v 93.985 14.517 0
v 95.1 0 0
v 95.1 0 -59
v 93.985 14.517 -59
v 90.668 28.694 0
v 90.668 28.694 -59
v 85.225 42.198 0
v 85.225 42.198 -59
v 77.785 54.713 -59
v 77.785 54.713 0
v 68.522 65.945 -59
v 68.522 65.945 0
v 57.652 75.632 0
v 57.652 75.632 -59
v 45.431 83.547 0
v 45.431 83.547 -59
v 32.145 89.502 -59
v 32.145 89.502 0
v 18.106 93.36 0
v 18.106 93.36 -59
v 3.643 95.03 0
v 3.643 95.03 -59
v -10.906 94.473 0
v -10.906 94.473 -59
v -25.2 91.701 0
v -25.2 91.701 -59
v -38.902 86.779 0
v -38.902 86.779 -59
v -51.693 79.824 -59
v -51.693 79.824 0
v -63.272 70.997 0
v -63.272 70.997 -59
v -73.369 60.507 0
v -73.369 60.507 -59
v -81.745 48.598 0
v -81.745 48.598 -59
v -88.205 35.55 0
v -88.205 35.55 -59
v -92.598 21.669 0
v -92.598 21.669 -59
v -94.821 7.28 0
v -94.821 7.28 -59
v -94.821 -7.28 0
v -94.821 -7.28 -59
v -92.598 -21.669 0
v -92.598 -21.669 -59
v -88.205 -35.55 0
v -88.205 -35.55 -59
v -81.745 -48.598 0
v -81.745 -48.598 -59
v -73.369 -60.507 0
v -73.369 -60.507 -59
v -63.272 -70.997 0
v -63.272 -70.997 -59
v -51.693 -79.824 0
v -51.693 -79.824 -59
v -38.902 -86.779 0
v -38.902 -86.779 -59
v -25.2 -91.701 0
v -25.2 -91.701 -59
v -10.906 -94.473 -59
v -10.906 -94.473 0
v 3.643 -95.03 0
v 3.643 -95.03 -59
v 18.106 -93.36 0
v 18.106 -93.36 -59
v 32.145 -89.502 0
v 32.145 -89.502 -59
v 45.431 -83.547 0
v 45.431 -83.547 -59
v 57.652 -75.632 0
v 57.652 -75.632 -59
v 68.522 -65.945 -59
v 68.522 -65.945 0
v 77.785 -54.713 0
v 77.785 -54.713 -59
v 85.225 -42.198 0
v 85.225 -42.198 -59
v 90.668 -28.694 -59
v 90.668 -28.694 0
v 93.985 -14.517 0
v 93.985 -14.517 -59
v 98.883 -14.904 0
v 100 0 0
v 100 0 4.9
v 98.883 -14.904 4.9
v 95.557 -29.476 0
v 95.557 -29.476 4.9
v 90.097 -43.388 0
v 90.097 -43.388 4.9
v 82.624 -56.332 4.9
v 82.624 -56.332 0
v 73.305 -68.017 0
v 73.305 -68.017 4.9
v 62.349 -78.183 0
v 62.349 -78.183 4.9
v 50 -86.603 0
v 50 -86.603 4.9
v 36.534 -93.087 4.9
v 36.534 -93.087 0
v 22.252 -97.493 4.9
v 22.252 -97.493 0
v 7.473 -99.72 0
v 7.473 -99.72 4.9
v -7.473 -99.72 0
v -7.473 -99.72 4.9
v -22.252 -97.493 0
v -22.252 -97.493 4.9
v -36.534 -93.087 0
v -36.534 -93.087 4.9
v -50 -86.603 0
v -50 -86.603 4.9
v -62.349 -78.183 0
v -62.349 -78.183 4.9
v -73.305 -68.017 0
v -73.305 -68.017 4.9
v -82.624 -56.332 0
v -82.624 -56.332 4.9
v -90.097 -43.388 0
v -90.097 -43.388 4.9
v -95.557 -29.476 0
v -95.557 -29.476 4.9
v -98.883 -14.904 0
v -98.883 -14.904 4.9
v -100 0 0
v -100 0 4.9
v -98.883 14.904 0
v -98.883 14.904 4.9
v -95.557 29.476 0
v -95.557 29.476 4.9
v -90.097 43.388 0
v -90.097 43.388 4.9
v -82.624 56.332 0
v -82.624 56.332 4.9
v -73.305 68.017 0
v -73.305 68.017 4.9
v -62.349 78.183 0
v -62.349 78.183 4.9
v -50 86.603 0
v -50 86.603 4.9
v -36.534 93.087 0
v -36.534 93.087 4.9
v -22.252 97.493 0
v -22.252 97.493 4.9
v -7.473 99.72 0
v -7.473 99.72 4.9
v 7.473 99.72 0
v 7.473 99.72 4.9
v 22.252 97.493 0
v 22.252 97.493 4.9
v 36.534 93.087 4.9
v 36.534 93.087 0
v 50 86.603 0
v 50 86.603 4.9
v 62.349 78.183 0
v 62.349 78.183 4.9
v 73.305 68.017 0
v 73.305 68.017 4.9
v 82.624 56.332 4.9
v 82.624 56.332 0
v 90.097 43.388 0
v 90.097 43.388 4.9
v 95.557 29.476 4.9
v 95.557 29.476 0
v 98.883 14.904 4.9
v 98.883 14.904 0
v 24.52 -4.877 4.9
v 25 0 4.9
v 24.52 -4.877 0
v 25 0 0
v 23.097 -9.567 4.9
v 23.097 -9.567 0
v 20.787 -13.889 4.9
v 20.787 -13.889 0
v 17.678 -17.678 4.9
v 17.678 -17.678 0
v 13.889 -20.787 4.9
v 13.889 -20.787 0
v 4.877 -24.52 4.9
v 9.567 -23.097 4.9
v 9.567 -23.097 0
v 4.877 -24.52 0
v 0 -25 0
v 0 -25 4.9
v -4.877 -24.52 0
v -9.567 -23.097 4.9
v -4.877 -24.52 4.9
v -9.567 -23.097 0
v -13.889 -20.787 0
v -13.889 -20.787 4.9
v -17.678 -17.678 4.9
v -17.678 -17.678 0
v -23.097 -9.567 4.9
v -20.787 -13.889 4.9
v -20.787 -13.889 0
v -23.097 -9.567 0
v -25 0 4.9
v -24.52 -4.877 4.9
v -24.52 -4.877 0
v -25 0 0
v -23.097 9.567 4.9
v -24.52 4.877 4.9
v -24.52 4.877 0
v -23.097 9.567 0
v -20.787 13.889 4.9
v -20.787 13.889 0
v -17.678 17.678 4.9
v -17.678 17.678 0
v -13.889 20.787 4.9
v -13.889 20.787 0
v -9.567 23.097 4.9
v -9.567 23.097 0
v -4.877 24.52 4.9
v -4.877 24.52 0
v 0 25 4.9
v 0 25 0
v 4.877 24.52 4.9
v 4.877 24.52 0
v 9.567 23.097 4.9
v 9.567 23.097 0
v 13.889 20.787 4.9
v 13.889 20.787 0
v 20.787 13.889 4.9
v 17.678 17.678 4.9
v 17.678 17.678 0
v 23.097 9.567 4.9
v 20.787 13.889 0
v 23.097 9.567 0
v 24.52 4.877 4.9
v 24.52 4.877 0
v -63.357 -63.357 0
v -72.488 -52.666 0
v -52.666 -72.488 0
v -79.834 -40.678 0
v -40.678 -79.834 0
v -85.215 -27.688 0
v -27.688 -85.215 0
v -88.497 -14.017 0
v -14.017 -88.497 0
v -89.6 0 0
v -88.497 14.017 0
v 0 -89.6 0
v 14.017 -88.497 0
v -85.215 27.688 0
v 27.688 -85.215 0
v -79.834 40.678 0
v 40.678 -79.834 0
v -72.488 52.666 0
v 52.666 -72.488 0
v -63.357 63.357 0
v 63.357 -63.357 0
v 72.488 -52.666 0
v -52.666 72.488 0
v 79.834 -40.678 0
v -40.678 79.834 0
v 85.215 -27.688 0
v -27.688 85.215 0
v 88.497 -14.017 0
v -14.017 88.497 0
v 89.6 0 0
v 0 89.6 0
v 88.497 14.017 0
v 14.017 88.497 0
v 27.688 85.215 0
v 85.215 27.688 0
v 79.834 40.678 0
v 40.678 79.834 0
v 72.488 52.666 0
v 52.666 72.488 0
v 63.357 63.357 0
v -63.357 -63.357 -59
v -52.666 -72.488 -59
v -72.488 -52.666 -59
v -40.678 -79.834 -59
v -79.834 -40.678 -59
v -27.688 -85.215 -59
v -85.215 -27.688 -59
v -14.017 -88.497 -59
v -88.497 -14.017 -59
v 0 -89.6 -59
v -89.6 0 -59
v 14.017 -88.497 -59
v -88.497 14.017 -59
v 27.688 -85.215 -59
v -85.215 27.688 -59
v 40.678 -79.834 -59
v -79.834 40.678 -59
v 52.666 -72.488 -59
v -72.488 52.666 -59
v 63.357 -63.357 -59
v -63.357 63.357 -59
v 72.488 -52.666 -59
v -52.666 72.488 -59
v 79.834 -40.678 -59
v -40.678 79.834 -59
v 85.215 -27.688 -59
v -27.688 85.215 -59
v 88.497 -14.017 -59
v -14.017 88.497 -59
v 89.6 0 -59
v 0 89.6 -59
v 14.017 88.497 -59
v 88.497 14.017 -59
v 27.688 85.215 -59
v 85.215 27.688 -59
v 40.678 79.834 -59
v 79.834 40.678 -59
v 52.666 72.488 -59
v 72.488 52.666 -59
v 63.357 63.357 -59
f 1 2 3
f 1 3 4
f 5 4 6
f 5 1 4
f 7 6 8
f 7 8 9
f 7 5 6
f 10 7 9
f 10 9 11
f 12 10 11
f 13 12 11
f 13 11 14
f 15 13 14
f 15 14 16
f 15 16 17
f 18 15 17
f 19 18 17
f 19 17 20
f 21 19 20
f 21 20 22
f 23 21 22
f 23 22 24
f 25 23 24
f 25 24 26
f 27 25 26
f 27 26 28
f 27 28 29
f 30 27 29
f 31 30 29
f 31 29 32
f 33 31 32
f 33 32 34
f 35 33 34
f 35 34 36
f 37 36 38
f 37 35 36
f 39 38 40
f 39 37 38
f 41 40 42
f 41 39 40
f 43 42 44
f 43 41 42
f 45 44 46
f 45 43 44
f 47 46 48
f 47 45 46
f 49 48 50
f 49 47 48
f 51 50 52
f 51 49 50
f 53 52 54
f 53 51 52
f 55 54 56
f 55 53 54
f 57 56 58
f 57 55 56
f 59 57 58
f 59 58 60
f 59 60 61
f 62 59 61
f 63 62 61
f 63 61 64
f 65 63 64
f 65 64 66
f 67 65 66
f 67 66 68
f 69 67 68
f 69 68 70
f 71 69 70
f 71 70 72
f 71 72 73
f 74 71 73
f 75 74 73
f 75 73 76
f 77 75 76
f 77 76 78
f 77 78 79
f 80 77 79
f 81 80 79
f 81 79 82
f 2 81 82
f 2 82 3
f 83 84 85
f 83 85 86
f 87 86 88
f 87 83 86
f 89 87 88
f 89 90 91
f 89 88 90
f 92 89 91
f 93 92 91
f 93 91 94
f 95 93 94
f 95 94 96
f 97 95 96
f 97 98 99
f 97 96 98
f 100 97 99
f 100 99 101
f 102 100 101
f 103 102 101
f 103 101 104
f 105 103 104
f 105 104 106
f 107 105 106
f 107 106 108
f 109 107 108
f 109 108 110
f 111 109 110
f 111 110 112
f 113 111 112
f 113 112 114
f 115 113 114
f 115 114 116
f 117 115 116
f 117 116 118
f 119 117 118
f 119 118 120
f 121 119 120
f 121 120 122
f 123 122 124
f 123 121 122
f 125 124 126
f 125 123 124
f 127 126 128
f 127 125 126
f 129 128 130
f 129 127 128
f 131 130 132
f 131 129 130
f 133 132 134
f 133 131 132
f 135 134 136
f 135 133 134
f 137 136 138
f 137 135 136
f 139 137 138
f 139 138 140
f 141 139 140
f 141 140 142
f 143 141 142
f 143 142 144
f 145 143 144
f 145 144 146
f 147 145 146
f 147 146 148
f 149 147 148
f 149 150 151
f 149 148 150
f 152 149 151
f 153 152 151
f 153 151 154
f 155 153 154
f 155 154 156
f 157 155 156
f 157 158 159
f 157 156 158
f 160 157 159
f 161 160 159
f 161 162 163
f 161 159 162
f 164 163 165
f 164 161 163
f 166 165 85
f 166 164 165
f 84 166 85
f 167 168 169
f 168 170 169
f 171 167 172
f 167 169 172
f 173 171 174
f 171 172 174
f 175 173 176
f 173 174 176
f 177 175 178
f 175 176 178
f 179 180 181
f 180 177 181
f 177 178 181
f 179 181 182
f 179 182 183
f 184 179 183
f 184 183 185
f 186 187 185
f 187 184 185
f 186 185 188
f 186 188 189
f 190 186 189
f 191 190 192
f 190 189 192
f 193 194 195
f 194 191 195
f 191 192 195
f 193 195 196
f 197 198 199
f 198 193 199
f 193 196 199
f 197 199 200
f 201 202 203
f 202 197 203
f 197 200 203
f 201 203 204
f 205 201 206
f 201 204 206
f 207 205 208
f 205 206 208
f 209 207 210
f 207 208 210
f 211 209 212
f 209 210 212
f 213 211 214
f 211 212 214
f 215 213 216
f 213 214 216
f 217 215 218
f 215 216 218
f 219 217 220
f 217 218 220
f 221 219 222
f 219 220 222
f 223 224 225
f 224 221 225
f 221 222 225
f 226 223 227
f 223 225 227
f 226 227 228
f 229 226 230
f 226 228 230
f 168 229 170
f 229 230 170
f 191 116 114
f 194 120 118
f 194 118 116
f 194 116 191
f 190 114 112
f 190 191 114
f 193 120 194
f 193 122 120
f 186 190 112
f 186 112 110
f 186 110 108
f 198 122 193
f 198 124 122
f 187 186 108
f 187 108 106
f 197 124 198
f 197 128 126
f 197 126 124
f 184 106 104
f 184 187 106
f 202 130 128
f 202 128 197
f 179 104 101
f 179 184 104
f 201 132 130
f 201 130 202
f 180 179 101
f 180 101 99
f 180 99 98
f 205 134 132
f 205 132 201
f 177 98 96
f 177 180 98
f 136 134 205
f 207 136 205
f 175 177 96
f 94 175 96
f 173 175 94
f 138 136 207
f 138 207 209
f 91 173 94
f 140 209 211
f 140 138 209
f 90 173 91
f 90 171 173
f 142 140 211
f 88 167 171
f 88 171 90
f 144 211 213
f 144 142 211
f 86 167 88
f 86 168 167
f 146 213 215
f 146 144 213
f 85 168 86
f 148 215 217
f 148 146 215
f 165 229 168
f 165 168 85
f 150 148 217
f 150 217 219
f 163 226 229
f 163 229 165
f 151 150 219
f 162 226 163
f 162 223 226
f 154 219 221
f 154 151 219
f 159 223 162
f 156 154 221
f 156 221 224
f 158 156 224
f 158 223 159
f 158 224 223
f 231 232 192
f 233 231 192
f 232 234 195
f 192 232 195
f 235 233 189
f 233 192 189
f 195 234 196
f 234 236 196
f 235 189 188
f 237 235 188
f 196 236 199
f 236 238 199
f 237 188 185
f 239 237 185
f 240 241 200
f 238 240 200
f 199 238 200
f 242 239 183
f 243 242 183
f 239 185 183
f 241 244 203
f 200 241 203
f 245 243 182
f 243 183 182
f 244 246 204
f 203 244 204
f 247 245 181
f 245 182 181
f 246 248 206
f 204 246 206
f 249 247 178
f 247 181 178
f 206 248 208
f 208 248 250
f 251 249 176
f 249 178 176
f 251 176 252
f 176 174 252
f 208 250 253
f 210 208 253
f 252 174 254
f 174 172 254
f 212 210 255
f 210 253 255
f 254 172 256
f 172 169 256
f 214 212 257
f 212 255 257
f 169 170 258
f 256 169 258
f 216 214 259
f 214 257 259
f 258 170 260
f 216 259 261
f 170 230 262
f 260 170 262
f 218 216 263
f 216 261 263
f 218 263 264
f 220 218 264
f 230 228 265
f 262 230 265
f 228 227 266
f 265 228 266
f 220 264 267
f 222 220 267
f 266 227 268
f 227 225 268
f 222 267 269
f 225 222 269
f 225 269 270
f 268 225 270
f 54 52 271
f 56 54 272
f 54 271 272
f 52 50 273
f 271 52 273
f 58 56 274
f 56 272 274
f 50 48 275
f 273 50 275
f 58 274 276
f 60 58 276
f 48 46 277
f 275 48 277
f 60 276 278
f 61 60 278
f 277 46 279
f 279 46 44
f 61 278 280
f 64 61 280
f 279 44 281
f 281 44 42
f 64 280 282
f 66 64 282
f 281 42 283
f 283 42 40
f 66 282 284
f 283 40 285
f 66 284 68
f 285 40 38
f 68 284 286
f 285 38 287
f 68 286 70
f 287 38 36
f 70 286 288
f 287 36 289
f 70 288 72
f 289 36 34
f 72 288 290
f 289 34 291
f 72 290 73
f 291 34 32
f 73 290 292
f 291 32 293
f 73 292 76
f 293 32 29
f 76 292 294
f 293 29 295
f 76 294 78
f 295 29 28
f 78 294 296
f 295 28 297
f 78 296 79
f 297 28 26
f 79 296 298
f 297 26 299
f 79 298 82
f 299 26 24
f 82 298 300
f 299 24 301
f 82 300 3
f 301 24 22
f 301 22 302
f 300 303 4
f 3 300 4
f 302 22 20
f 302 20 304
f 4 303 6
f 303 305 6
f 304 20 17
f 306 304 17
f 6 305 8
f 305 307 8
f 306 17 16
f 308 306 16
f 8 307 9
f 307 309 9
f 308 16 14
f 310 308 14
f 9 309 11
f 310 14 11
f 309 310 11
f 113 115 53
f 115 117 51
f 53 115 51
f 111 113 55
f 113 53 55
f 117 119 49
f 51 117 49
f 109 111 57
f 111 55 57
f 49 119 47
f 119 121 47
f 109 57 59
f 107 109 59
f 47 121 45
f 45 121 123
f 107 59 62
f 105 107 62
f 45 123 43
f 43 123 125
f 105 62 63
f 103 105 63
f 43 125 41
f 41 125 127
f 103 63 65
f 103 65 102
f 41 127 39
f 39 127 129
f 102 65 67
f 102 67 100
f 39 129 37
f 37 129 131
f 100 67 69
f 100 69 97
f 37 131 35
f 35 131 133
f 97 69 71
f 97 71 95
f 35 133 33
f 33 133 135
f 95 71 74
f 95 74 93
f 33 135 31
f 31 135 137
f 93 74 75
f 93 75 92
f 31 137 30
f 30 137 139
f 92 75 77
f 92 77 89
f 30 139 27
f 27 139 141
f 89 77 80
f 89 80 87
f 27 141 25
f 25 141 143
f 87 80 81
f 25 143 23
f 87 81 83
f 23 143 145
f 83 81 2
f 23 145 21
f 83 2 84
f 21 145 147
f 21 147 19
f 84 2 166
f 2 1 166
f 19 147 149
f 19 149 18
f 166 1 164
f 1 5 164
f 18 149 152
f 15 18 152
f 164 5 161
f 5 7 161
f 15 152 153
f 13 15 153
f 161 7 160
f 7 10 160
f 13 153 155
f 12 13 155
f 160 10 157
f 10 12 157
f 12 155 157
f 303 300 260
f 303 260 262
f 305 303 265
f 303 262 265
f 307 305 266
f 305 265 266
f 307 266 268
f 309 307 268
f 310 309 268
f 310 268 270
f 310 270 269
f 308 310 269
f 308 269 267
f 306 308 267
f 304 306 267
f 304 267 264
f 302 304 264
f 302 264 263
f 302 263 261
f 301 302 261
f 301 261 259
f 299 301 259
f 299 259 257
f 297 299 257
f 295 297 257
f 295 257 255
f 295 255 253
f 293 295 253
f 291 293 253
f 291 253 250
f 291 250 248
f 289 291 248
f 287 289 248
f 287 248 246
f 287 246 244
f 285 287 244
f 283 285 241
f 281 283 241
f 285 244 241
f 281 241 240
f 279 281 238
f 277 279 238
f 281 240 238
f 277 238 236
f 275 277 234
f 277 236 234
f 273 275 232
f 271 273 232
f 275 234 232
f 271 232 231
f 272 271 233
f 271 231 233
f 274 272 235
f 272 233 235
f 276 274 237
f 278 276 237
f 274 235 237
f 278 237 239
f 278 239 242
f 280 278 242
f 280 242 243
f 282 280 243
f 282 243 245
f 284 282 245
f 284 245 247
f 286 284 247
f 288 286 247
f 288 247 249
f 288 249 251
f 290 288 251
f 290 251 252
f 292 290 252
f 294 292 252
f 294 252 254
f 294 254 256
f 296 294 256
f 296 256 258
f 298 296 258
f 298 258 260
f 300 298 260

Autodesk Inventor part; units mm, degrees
ref_plane "YZ Plane" through (0, 0, 0) normal (1, 0, 0) x (0, 1, 0)
ref_plane "XZ Plane" through (0, 0, 0) normal (0, 1, 0) x (-1, 0, 0)
ref_plane "XY Plane" through (0, 0, 0) normal (0, 0, 1) x (1, 0, 0)
sketch "Skizze1" plane through (0, 0, 0) normal (0, 0, 1) x (1, 0, 0)
  circle A0 centre (0, 0) radius 100
  circle A1 centre (0, 0) radius 95.1
  circle A2 centre (0, 0) radius 89.6
  circle A3 centre (0, 0) radius 25
  dimension "d0" = 200
  dimension "d1" = 4.9
  dimension "d2" = 5.5
  dimension "d7" = 50
extrude "Extrusion1" add sketch "Skizze1" along normal blind 4.9 contours A0 | A1 | A2
extrude "Extrusion2" add sketch "Skizze1" against normal blind 59 contours A1
equation "\"d0\" = kg_diameter"
equation "\"d1\" = kg_thickness"
equation "\"d7\" = ht_diameter"
equation "\"d3\" = kg_thickness"
equation "\"kg_diameter\" = 200"
equation "\"kg_thickness\" = 4.9"
equation "\"ht_diameter\" = 50"
equation "\"ht_thickness\" = 1.9"
equation "\"case_thickness\" = 18"
equation "\"gap_fit\" = 0.1"
equation "\"gap_slide\" = 0.2"
equation "\"gap_air\" = 1"
equation "\"bore_diameter\" = 73"
equation "\"tape_thickness\" = 3"
equation "\"mdf_thickness\" = 6"
equation "\"tape_width\" = 15"
equation "\"inner_thickness\" = 15"
equation "\"inner_depth\" = 255"
properties part number "Zyklon_Deckel"
